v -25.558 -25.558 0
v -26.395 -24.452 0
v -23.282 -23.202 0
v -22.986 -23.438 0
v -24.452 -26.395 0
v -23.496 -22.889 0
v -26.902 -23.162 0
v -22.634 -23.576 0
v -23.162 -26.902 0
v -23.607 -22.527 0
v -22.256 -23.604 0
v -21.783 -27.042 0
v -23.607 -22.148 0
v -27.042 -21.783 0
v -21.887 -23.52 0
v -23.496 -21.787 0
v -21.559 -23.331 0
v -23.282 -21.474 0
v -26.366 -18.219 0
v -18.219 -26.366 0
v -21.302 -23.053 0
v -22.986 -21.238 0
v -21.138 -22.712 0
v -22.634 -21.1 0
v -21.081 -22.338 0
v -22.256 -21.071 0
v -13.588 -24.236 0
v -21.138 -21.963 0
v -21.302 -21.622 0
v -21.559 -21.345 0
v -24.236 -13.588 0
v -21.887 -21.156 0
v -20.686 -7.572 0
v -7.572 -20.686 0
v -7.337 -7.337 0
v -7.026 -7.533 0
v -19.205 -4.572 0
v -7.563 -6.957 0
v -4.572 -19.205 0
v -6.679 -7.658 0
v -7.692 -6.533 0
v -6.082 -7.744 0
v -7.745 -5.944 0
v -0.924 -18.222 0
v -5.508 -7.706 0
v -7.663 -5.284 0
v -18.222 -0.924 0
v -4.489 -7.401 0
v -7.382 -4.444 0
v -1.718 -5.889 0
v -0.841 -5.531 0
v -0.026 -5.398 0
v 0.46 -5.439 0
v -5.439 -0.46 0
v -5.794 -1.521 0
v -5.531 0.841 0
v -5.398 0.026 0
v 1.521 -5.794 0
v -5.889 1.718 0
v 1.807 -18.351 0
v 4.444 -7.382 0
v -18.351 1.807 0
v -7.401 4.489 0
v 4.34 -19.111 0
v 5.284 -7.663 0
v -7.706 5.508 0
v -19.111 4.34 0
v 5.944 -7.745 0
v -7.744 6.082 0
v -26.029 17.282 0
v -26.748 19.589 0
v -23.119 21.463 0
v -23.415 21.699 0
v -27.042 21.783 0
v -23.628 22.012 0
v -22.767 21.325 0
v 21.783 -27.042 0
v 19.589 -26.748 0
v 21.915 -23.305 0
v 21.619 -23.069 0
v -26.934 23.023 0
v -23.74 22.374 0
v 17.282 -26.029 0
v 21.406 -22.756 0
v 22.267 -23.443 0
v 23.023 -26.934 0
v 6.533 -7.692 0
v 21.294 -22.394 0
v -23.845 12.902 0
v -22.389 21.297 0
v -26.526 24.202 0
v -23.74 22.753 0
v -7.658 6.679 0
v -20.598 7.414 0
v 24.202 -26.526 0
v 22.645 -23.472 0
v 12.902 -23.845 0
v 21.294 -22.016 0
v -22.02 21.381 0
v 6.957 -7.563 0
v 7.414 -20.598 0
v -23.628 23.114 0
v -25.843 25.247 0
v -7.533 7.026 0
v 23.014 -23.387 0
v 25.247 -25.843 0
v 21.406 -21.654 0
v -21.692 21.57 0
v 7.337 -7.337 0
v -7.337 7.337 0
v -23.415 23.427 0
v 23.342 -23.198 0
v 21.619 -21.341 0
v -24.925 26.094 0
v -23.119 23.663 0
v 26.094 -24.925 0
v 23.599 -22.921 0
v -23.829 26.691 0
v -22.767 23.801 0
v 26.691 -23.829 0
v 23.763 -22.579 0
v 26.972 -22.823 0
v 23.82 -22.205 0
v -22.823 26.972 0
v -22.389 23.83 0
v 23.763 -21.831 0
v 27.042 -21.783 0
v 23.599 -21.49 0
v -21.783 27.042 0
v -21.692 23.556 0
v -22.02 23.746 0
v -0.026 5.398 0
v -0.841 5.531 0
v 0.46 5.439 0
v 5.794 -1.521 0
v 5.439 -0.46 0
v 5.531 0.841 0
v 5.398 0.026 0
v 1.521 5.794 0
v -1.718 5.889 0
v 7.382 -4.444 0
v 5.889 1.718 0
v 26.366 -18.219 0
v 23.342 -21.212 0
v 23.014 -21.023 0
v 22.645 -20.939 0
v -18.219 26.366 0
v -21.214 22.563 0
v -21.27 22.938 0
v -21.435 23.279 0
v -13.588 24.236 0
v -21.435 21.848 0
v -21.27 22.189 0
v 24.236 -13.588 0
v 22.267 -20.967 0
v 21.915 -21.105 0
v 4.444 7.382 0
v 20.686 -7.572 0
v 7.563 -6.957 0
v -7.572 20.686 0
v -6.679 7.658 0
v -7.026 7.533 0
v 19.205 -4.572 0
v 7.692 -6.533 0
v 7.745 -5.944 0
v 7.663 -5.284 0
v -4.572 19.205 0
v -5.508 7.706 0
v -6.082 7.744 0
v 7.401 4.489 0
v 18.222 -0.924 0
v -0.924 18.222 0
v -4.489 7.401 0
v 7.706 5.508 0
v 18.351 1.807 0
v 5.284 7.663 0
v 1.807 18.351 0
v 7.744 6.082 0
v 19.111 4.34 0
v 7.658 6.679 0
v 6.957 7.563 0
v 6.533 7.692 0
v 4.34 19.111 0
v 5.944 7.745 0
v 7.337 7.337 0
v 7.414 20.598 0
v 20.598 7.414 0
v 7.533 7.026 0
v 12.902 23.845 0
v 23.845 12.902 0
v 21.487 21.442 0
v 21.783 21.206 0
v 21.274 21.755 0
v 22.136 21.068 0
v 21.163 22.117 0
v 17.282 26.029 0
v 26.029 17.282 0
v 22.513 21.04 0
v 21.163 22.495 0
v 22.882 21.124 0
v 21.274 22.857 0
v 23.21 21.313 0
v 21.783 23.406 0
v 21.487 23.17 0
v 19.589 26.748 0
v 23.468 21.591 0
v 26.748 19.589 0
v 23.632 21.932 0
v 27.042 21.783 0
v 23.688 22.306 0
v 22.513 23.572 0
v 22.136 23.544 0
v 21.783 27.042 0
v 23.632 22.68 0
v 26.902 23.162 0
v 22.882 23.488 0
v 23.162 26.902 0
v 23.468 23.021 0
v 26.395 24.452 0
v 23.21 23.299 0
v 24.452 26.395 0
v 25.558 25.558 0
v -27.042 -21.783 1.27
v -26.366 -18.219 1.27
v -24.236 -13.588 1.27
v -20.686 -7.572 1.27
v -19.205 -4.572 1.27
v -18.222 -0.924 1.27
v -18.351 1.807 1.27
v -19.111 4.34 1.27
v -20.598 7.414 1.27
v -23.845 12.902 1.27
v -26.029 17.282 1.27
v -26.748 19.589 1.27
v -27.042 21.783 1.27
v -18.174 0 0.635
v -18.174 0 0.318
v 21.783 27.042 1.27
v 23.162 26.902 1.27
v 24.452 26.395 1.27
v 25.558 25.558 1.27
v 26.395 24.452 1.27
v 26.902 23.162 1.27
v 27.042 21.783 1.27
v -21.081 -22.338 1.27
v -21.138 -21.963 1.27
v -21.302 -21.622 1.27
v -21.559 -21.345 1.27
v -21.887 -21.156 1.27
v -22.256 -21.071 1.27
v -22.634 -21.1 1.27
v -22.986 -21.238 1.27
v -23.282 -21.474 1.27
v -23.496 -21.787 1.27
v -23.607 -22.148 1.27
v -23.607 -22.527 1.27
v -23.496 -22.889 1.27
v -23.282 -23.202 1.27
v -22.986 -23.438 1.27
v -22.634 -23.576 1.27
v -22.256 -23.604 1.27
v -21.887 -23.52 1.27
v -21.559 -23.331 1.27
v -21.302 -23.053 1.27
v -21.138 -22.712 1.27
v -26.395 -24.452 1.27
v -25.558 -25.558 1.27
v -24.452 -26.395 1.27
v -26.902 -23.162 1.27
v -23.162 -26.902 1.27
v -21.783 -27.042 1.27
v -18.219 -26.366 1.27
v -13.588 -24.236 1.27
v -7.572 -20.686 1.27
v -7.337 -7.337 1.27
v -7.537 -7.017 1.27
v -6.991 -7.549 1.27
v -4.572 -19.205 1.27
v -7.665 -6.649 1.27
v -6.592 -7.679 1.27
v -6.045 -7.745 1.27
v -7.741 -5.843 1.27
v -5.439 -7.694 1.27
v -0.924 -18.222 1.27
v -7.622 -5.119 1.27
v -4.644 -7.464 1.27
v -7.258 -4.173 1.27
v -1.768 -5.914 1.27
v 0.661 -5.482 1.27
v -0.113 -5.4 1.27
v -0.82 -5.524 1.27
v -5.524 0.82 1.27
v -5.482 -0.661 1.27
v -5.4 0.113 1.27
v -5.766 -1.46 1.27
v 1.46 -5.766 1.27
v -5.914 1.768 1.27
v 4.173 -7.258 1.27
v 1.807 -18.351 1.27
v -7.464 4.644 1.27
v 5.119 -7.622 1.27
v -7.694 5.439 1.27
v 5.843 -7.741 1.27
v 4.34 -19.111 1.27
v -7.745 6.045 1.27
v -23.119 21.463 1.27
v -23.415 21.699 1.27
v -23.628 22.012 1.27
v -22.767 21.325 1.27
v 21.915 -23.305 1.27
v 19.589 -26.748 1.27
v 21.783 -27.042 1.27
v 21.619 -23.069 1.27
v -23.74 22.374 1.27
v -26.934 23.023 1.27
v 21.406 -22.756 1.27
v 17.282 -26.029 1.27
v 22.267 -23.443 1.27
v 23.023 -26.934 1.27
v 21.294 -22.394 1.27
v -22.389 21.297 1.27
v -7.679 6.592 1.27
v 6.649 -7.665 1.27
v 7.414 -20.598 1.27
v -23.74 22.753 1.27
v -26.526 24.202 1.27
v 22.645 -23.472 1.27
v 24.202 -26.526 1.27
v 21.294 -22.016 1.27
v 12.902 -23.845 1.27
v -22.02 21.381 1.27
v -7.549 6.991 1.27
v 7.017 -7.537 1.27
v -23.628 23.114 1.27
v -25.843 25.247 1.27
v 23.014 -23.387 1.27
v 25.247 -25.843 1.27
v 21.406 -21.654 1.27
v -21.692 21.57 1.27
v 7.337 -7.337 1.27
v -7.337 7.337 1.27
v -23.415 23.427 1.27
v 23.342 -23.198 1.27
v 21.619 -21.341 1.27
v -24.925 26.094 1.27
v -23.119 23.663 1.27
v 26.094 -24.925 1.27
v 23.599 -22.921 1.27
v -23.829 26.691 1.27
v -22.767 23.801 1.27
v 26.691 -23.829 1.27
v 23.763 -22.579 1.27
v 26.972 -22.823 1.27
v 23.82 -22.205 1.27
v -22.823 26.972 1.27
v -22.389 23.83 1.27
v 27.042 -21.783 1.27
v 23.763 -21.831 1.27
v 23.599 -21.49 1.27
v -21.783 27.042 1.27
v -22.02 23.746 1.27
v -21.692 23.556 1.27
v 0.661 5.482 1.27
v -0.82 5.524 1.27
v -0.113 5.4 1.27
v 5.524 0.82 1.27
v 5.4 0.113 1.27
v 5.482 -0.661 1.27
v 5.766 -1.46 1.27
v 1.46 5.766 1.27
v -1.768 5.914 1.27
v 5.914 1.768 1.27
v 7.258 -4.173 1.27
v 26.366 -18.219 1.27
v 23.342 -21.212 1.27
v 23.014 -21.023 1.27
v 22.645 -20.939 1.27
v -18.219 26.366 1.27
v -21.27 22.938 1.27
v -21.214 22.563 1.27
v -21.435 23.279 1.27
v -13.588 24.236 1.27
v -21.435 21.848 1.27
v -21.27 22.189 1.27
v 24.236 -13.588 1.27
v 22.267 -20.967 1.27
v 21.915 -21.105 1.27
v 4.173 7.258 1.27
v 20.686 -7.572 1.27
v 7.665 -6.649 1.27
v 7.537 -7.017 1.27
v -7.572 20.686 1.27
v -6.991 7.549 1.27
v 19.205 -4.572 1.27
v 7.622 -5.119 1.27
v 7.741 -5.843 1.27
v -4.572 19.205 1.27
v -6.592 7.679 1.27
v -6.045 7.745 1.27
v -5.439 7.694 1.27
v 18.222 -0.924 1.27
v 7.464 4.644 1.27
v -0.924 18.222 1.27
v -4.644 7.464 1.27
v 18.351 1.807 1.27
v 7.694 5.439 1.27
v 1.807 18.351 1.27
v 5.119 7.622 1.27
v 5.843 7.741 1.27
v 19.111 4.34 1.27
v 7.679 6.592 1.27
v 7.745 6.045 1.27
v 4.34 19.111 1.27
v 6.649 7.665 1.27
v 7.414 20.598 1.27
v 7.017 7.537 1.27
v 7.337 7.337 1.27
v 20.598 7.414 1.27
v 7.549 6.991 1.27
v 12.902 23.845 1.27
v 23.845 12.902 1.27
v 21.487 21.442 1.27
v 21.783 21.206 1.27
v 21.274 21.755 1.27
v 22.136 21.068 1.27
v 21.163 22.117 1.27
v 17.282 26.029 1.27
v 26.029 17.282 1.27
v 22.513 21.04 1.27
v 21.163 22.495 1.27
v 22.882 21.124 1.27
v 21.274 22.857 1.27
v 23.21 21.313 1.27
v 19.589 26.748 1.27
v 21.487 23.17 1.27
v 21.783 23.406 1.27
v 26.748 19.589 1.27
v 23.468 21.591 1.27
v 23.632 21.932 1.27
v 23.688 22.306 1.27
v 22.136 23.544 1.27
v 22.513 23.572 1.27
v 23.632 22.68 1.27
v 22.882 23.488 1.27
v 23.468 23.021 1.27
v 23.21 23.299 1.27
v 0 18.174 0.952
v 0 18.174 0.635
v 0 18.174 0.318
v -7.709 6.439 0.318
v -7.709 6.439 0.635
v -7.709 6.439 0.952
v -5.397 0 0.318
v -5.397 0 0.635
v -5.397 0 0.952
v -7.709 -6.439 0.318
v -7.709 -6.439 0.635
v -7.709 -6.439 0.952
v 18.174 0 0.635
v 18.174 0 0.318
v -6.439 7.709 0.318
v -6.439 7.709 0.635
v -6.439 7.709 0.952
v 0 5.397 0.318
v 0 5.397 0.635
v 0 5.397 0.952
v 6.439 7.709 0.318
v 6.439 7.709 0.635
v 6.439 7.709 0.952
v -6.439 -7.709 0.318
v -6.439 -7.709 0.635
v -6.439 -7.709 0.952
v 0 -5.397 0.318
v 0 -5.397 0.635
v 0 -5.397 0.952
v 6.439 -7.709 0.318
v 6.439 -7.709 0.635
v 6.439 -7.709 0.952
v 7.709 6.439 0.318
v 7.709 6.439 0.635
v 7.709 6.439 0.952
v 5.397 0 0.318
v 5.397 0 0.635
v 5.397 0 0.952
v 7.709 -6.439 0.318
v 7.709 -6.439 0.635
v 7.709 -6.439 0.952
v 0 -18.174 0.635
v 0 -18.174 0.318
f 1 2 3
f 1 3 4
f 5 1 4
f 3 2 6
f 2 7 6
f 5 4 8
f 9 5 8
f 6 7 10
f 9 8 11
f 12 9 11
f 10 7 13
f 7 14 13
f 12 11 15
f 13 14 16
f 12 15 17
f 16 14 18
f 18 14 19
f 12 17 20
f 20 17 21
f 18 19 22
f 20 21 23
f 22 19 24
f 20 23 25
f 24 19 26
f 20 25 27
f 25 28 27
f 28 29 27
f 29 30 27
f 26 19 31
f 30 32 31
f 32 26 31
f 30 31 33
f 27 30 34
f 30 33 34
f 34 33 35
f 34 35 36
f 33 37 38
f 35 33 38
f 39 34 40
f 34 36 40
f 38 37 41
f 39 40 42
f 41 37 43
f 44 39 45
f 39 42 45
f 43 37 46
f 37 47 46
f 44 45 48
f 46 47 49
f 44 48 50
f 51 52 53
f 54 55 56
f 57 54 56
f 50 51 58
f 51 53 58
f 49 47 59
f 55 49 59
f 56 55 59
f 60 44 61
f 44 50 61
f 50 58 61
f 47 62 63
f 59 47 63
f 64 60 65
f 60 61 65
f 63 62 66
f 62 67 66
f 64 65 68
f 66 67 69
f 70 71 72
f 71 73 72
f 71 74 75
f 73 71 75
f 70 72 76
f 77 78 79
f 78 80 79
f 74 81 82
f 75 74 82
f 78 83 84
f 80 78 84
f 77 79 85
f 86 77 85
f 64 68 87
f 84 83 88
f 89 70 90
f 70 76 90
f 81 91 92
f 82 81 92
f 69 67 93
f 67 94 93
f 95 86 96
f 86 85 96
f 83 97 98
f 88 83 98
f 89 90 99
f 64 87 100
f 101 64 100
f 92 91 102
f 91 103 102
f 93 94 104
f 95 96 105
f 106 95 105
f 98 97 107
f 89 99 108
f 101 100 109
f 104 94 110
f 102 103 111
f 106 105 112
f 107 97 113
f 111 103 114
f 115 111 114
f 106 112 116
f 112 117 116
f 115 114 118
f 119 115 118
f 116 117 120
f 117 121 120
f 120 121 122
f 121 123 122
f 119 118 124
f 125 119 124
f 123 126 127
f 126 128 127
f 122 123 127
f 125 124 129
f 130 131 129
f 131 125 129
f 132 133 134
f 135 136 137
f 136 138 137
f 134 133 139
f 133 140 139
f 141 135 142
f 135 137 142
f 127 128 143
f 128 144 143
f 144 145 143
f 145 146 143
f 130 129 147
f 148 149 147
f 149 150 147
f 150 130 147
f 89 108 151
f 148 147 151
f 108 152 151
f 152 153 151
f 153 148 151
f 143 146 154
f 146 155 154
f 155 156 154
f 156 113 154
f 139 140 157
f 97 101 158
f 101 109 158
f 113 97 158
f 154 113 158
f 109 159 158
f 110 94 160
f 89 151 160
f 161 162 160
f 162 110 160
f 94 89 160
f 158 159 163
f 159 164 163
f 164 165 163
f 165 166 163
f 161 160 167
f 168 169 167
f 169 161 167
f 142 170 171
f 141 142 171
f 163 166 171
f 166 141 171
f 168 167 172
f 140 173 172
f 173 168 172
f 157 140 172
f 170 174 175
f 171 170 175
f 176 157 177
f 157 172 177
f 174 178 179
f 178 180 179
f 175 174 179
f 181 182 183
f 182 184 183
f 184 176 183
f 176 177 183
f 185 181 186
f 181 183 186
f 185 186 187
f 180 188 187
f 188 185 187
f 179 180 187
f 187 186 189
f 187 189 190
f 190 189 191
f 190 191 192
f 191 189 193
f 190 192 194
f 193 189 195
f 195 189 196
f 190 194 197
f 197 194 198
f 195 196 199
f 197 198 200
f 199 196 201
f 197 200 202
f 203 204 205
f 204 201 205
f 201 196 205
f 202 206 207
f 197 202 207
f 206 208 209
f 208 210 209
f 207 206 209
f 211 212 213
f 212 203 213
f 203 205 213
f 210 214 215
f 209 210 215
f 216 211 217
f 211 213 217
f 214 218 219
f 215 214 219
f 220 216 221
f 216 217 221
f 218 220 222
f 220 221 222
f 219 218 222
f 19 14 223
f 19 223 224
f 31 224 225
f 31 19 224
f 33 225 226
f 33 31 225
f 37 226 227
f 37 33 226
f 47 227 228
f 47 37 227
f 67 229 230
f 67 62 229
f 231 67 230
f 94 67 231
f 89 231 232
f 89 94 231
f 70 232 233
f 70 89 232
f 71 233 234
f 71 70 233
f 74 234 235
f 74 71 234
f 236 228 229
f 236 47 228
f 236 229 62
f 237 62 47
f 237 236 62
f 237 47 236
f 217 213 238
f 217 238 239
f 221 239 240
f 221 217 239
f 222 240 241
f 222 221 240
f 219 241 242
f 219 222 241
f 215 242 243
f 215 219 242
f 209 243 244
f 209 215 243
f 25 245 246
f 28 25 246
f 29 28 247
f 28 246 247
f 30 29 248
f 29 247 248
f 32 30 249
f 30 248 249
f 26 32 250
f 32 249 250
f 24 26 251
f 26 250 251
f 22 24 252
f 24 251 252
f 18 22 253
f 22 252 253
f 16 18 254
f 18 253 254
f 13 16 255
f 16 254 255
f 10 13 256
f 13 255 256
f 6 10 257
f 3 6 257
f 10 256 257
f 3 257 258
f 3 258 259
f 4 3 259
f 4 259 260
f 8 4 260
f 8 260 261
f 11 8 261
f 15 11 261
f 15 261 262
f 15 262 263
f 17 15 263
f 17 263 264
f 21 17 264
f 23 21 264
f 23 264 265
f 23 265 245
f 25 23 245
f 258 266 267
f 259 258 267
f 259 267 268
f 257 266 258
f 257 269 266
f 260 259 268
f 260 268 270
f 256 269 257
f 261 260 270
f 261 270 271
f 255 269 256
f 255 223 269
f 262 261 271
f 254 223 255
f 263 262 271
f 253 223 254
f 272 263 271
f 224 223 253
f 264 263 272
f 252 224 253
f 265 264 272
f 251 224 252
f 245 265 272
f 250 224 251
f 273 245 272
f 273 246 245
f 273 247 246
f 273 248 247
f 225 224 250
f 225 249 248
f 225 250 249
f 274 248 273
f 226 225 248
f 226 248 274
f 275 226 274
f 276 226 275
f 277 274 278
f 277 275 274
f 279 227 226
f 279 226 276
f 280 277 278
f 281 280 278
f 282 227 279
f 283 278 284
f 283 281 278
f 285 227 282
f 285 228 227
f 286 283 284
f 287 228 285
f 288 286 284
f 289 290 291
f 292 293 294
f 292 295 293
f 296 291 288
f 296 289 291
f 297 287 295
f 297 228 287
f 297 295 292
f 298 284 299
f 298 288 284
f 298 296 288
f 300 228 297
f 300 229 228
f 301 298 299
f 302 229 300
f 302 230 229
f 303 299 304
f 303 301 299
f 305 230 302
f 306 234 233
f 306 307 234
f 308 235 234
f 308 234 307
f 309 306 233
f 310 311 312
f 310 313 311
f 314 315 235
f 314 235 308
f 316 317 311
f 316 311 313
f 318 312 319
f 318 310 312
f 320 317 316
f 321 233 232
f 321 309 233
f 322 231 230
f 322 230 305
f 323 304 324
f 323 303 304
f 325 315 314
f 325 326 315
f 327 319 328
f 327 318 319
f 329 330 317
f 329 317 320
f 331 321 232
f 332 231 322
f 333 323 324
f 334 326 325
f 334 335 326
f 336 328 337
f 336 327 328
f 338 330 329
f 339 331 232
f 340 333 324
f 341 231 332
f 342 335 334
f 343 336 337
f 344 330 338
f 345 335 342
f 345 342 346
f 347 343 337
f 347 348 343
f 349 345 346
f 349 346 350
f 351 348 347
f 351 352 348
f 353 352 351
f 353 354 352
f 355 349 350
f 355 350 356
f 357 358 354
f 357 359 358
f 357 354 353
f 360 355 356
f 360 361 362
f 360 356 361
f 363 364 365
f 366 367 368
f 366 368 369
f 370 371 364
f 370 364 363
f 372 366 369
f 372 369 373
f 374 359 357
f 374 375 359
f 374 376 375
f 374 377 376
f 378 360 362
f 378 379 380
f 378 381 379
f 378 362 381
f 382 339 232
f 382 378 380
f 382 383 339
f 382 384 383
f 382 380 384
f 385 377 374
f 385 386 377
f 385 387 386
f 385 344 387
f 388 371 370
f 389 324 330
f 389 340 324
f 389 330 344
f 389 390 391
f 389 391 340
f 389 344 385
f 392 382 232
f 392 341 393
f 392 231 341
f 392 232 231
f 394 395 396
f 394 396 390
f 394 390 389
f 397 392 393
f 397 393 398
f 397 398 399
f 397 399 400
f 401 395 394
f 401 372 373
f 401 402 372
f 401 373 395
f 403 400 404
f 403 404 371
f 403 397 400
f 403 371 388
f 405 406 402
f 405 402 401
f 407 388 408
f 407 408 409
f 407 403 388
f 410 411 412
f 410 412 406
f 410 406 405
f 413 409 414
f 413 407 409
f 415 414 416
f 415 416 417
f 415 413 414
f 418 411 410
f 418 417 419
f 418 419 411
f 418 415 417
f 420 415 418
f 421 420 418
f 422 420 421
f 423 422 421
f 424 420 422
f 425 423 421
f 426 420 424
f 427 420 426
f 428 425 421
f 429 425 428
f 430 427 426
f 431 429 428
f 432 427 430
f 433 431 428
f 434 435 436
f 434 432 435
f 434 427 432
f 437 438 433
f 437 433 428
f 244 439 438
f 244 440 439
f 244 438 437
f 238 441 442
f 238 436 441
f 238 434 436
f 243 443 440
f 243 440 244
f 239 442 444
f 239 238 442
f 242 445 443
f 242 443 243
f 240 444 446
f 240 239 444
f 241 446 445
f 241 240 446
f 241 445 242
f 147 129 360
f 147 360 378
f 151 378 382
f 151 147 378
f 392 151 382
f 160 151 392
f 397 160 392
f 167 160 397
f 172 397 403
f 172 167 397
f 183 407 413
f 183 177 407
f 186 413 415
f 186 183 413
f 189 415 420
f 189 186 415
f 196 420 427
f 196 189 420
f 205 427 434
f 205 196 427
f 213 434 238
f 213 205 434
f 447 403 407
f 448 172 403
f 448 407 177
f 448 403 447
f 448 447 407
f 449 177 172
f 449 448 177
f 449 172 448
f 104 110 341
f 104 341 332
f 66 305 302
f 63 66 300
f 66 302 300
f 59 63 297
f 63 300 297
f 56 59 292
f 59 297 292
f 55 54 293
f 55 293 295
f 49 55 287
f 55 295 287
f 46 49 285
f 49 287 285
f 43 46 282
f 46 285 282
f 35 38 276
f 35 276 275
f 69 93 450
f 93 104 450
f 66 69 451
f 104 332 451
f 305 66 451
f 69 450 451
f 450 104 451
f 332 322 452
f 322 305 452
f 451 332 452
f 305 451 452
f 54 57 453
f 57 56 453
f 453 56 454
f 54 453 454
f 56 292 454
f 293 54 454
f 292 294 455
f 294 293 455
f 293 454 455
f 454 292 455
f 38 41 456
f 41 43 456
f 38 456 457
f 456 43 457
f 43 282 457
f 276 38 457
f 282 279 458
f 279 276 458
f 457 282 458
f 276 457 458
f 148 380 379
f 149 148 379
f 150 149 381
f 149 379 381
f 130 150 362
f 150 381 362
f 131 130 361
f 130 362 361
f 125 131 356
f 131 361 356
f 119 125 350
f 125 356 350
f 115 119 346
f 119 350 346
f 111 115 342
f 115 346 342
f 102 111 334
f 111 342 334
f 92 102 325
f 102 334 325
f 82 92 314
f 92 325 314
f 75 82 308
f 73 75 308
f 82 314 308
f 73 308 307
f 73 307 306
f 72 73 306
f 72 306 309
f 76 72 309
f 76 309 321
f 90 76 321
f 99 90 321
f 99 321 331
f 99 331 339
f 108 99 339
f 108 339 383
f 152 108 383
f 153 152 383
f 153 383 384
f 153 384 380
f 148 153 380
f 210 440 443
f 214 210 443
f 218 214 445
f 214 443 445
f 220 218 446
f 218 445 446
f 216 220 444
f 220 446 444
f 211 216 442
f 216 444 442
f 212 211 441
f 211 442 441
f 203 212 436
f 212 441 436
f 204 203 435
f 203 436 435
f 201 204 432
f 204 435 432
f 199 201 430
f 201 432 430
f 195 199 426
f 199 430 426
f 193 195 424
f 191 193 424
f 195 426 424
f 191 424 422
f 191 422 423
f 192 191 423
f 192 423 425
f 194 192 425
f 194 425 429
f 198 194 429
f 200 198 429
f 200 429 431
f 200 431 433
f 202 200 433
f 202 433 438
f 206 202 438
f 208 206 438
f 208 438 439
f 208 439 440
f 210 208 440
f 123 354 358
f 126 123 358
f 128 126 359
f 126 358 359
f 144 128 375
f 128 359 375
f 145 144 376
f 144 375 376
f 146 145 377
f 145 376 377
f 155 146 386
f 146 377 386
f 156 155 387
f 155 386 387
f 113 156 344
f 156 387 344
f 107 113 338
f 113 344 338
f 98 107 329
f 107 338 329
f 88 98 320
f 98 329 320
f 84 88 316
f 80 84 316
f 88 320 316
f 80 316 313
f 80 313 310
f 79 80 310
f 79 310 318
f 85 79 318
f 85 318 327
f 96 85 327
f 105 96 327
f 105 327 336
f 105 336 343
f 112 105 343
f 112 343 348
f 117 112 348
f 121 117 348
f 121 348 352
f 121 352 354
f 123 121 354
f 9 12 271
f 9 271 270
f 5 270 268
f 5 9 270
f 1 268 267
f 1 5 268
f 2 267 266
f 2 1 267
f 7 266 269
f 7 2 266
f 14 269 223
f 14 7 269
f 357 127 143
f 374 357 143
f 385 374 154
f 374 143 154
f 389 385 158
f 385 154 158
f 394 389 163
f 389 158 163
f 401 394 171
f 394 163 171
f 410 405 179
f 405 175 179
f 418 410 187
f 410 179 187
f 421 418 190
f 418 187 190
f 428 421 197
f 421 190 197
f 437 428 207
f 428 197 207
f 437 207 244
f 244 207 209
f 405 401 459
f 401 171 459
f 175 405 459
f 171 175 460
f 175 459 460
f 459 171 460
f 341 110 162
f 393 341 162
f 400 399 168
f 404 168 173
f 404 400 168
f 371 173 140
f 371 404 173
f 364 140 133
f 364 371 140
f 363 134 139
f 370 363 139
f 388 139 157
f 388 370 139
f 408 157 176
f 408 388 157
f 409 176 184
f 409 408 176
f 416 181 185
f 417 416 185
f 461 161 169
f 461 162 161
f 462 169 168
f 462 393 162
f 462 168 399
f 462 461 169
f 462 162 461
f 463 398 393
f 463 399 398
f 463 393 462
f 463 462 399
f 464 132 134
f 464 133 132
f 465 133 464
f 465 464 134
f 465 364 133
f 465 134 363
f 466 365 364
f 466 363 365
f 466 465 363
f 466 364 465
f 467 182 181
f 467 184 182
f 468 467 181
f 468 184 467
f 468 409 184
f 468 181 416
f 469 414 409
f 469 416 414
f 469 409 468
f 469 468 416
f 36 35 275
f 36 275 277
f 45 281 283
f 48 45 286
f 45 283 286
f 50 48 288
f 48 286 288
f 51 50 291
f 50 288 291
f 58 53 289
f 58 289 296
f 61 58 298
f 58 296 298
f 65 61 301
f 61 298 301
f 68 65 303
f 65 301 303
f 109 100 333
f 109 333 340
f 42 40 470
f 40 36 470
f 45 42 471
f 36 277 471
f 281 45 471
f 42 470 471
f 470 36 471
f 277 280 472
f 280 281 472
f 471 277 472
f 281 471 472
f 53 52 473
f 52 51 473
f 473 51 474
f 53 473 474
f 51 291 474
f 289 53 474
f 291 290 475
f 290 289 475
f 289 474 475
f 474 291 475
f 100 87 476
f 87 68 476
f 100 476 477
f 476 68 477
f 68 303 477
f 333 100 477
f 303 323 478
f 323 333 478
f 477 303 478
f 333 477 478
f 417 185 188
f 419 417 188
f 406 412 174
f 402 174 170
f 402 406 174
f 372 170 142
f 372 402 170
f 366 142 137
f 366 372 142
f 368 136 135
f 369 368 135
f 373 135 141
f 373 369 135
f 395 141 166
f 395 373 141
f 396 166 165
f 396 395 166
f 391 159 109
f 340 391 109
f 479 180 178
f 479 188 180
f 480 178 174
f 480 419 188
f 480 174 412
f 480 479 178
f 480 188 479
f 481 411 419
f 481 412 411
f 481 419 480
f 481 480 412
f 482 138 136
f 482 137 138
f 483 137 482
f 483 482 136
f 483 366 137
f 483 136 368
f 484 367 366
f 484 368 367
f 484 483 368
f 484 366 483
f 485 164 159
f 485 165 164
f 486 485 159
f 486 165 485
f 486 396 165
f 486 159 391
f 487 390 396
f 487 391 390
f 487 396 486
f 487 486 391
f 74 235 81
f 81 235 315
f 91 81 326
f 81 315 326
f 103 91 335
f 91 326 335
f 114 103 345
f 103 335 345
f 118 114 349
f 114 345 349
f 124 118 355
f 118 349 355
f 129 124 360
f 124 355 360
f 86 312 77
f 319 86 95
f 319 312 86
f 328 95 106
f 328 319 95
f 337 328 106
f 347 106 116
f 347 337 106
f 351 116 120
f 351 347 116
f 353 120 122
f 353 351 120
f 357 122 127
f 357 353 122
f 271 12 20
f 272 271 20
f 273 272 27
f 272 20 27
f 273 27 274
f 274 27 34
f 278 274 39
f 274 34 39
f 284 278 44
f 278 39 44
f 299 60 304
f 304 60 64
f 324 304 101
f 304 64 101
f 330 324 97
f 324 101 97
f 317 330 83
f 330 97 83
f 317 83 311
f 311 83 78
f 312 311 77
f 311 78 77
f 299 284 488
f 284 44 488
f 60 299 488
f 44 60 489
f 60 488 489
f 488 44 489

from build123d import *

# Parameters (mm, degrees)
BOSS_EXTRUDE1_DEPTH = 1.27
FILLET1_START       = -1
FILLET1_DEPTH       = 3
FILLET2_START       = -1
FILLET2_DEPTH       = 3
FILLET3_R           = 5.08
FILLET4_R           = 5.08
SKETCH3_R           = 1.27
CUT_EXTRUDE1_DEPTH  = 39.269062151


with BuildPart() as part:
    # Sketch1 → Boss-Extrude1 (new body)
    with BuildSketch(Plane.XY):
        with BuildLine():
            add(Edge.make_bspline(
                [(-26.078451224, -26.078451224), (-25.595030672, -26.46689269), (-16.201372292, -29.50543677), (0, -7.636650328), (16.201372291, -29.50543677), (25.595030672, -26.46689269), (26.078451224, -26.078451224)],
                knots=[0.032766754, 0.032766754, 0.032766754, 0.032766754, 0.065533508, 0.5, 0.934466492, 0.967233246, 0.967233246, 0.967233246, 0.967233246], degree=3))
            add(Edge.make_bspline(
                [(26.078451224, -26.078451224), (26.46689269, -25.595030672), (29.505436772, -16.201372289), (7.636650328, -2e-09), (29.505436768, 16.201372294), (26.46689269, 25.595030672), (26.078451224, 26.078451224)],
                knots=[0.032766754, 0.032766754, 0.032766754, 0.032766754, 0.065533508, 0.5, 0.934466492, 0.967233246, 0.967233246, 0.967233246, 0.967233246], degree=3))
            add(Edge.make_bspline(
                [(-26.078451224, 26.078451224), (-25.595030672, 26.46689269), (-16.201372292, 29.50543677), (0, 7.636650328), (16.201372291, 29.50543677), (25.595030672, 26.46689269), (26.078451224, 26.078451224)],
                knots=[0.032766754, 0.032766754, 0.032766754, 0.032766754, 0.065533508, 0.5, 0.934466492, 0.967233246, 0.967233246, 0.967233246, 0.967233246], degree=3))
            add(Edge.make_bspline(
                [(-26.078451224, -26.078451224), (-26.46689269, -25.595030672), (-29.50543677, -16.201372292), (-7.636650328, 0), (-29.50543677, 16.201372291), (-26.46689269, 25.595030672), (-26.078451224, 26.078451224)],
                knots=[0.032766754, 0.032766754, 0.032766754, 0.032766754, 0.065533508, 0.5, 0.934466492, 0.967233246, 0.967233246, 0.967233246, 0.967233246], degree=3))
        make_face()
    extrude(amount=BOSS_EXTRUDE1_DEPTH)

    # Fillet1: read off the stored shape, not the designer's step
    # Fillet1 outline → Fillet1 (cut)
    with BuildSketch(Plane.XY.offset(FILLET1_START)):
        with BuildLine():
            add(Edge.make_bspline(
                [(26.078451224, 26.078451224), (25.595030672, 26.46689269), (24.088787806, 26.954113447), (22.608220096, 27.071858625), (21.782533291, 27.042115453)],
                knots=[0.032766754, 0.032766754, 0.032766754, 0.032766754, 0.065533508, 0.1076861, 0.1076861, 0.1076861, 0.1076861], degree=3))
            ThreePointArc((21.782533291, 27.042115453), (25.557510624, 25.557510623), (27.042115452, 21.78253329))
            add(Edge.make_bspline(
                [(27.042115452, 21.78253329), (27.071858625, 22.608220095), (26.954113447, 24.088787806), (26.46689269, 25.595030672), (26.078451224, 26.078451224)],
                knots=[0.8923139, 0.8923139, 0.8923139, 0.8923139, 0.934466492, 0.967233246, 0.967233246, 0.967233246, 0.967233246], degree=3))
        make_face()
    extrude(amount=FILLET1_DEPTH, mode=Mode.SUBTRACT)

    # Fillet2: read off the stored shape, not the designer's step
    # Fillet2 outline → Fillet2 (cut)
    with BuildSketch(Plane.XY.offset(FILLET2_START)):
        with BuildLine():
            add(Edge.make_bspline(
                [(-26.078451224, -26.078451224), (-25.595030672, -26.46689269), (-24.088787806, -26.954113447), (-22.608220096, -27.071858625), (-21.782533291, -27.042115453)],
                knots=[0.032766754, 0.032766754, 0.032766754, 0.032766754, 0.065533508, 0.1076861, 0.1076861, 0.1076861, 0.1076861], degree=3))
            ThreePointArc((-21.782533291, -27.042115453), (-25.557510624, -25.557510624), (-27.042115453, -21.782533291))
            add(Edge.make_bspline(
                [(-27.042115453, -21.782533291), (-27.071858625, -22.608220096), (-26.954113447, -24.088787806), (-26.46689269, -25.595030672), (-26.078451224, -26.078451224)],
                knots=[0.8923139, 0.8923139, 0.8923139, 0.8923139, 0.934466492, 0.967233246, 0.967233246, 0.967233246, 0.967233246], degree=3))
        make_face()
    extrude(amount=FILLET2_DEPTH, mode=Mode.SUBTRACT)

    # Fillet3
    fillet3_edges = [part.edges().sort_by_distance(p)[0] for p in [
        (-26.078451224, 26.078451224, 0.635),
    ]]
    fillet(fillet3_edges, radius=FILLET3_R)

    # Fillet4
    fillet4_edges = [part.edges().sort_by_distance(p)[0] for p in [
        (26.078451224, -26.078451224, 0.635),
    ]]
    fillet(fillet4_edges, radius=FILLET4_R)

    # Sketch3 → Cut-Extrude1 (cut, through all)
    with BuildSketch(Plane.XY.offset(1.27)):
        with Locations((-22.483919179, 22.563317918)):
            Circle(SKETCH3_R)
        with Locations((-22.351271412, -22.337766752)):
            Circle(SKETCH3_R)
        with Locations((22.549813258, -22.205118985)):
            Circle(SKETCH3_R)
        with Locations((22.418317518, 22.306006297)):
            Circle(SKETCH3_R)
        with BuildLine():
            add(Edge.make_bspline(
                [(-7.336925612, -7.336925612), (-7.094564954, -7.539990493), (-4.441685448, -8.467510629), (0, -2.70941912), (4.441685448, -8.467510629), (7.094564954, -7.539990493), (7.336925612, -7.336925612)],
                knots=[0.055321023, 0.055321023, 0.055321023, 0.055321023, 0.110642047, 0.5, 0.889357953, 0.944678976, 0.944678976, 0.944678976, 0.944678976], degree=3))
            add(Edge.make_bspline(
                [(7.336925612, 7.336925612), (7.539990493, 7.094564954), (8.467510629, 4.441685448), (2.70941912, 0), (8.467510629, -4.441685448), (7.539990493, -7.094564954), (7.336925612, -7.336925612)],
                knots=[0.055321023, 0.055321023, 0.055321023, 0.055321023, 0.110642047, 0.5, 0.889357953, 0.944678977, 0.944678977, 0.944678977, 0.944678977], degree=3))
            add(Edge.make_bspline(
                [(-7.336925612, 7.336925612), (-7.094564954, 7.539990493), (-4.441685448, 8.467510629), (0, 2.70941912), (4.441685448, 8.467510629), (7.094564954, 7.539990493), (7.336925612, 7.336925612)],
                knots=[0.055321023, 0.055321023, 0.055321023, 0.055321023, 0.110642047, 0.5, 0.889357953, 0.944678977, 0.944678977, 0.944678977, 0.944678977], degree=3))
            add(Edge.make_bspline(
                [(-7.336925612, 7.336925612), (-7.539990493, 7.094564954), (-8.467510629, 4.441685448), (-2.70941912, 0), (-8.467510629, -4.441685448), (-7.539990493, -7.094564954), (-7.336925612, -7.336925612)],
                knots=[0.055321023, 0.055321023, 0.055321023, 0.055321023, 0.110642047, 0.5, 0.889357953, 0.944678977, 0.944678977, 0.944678977, 0.944678977], degree=3))
        make_face()
    extrude(amount=-CUT_EXTRUDE1_DEPTH, mode=Mode.SUBTRACT)


solid = part.part
